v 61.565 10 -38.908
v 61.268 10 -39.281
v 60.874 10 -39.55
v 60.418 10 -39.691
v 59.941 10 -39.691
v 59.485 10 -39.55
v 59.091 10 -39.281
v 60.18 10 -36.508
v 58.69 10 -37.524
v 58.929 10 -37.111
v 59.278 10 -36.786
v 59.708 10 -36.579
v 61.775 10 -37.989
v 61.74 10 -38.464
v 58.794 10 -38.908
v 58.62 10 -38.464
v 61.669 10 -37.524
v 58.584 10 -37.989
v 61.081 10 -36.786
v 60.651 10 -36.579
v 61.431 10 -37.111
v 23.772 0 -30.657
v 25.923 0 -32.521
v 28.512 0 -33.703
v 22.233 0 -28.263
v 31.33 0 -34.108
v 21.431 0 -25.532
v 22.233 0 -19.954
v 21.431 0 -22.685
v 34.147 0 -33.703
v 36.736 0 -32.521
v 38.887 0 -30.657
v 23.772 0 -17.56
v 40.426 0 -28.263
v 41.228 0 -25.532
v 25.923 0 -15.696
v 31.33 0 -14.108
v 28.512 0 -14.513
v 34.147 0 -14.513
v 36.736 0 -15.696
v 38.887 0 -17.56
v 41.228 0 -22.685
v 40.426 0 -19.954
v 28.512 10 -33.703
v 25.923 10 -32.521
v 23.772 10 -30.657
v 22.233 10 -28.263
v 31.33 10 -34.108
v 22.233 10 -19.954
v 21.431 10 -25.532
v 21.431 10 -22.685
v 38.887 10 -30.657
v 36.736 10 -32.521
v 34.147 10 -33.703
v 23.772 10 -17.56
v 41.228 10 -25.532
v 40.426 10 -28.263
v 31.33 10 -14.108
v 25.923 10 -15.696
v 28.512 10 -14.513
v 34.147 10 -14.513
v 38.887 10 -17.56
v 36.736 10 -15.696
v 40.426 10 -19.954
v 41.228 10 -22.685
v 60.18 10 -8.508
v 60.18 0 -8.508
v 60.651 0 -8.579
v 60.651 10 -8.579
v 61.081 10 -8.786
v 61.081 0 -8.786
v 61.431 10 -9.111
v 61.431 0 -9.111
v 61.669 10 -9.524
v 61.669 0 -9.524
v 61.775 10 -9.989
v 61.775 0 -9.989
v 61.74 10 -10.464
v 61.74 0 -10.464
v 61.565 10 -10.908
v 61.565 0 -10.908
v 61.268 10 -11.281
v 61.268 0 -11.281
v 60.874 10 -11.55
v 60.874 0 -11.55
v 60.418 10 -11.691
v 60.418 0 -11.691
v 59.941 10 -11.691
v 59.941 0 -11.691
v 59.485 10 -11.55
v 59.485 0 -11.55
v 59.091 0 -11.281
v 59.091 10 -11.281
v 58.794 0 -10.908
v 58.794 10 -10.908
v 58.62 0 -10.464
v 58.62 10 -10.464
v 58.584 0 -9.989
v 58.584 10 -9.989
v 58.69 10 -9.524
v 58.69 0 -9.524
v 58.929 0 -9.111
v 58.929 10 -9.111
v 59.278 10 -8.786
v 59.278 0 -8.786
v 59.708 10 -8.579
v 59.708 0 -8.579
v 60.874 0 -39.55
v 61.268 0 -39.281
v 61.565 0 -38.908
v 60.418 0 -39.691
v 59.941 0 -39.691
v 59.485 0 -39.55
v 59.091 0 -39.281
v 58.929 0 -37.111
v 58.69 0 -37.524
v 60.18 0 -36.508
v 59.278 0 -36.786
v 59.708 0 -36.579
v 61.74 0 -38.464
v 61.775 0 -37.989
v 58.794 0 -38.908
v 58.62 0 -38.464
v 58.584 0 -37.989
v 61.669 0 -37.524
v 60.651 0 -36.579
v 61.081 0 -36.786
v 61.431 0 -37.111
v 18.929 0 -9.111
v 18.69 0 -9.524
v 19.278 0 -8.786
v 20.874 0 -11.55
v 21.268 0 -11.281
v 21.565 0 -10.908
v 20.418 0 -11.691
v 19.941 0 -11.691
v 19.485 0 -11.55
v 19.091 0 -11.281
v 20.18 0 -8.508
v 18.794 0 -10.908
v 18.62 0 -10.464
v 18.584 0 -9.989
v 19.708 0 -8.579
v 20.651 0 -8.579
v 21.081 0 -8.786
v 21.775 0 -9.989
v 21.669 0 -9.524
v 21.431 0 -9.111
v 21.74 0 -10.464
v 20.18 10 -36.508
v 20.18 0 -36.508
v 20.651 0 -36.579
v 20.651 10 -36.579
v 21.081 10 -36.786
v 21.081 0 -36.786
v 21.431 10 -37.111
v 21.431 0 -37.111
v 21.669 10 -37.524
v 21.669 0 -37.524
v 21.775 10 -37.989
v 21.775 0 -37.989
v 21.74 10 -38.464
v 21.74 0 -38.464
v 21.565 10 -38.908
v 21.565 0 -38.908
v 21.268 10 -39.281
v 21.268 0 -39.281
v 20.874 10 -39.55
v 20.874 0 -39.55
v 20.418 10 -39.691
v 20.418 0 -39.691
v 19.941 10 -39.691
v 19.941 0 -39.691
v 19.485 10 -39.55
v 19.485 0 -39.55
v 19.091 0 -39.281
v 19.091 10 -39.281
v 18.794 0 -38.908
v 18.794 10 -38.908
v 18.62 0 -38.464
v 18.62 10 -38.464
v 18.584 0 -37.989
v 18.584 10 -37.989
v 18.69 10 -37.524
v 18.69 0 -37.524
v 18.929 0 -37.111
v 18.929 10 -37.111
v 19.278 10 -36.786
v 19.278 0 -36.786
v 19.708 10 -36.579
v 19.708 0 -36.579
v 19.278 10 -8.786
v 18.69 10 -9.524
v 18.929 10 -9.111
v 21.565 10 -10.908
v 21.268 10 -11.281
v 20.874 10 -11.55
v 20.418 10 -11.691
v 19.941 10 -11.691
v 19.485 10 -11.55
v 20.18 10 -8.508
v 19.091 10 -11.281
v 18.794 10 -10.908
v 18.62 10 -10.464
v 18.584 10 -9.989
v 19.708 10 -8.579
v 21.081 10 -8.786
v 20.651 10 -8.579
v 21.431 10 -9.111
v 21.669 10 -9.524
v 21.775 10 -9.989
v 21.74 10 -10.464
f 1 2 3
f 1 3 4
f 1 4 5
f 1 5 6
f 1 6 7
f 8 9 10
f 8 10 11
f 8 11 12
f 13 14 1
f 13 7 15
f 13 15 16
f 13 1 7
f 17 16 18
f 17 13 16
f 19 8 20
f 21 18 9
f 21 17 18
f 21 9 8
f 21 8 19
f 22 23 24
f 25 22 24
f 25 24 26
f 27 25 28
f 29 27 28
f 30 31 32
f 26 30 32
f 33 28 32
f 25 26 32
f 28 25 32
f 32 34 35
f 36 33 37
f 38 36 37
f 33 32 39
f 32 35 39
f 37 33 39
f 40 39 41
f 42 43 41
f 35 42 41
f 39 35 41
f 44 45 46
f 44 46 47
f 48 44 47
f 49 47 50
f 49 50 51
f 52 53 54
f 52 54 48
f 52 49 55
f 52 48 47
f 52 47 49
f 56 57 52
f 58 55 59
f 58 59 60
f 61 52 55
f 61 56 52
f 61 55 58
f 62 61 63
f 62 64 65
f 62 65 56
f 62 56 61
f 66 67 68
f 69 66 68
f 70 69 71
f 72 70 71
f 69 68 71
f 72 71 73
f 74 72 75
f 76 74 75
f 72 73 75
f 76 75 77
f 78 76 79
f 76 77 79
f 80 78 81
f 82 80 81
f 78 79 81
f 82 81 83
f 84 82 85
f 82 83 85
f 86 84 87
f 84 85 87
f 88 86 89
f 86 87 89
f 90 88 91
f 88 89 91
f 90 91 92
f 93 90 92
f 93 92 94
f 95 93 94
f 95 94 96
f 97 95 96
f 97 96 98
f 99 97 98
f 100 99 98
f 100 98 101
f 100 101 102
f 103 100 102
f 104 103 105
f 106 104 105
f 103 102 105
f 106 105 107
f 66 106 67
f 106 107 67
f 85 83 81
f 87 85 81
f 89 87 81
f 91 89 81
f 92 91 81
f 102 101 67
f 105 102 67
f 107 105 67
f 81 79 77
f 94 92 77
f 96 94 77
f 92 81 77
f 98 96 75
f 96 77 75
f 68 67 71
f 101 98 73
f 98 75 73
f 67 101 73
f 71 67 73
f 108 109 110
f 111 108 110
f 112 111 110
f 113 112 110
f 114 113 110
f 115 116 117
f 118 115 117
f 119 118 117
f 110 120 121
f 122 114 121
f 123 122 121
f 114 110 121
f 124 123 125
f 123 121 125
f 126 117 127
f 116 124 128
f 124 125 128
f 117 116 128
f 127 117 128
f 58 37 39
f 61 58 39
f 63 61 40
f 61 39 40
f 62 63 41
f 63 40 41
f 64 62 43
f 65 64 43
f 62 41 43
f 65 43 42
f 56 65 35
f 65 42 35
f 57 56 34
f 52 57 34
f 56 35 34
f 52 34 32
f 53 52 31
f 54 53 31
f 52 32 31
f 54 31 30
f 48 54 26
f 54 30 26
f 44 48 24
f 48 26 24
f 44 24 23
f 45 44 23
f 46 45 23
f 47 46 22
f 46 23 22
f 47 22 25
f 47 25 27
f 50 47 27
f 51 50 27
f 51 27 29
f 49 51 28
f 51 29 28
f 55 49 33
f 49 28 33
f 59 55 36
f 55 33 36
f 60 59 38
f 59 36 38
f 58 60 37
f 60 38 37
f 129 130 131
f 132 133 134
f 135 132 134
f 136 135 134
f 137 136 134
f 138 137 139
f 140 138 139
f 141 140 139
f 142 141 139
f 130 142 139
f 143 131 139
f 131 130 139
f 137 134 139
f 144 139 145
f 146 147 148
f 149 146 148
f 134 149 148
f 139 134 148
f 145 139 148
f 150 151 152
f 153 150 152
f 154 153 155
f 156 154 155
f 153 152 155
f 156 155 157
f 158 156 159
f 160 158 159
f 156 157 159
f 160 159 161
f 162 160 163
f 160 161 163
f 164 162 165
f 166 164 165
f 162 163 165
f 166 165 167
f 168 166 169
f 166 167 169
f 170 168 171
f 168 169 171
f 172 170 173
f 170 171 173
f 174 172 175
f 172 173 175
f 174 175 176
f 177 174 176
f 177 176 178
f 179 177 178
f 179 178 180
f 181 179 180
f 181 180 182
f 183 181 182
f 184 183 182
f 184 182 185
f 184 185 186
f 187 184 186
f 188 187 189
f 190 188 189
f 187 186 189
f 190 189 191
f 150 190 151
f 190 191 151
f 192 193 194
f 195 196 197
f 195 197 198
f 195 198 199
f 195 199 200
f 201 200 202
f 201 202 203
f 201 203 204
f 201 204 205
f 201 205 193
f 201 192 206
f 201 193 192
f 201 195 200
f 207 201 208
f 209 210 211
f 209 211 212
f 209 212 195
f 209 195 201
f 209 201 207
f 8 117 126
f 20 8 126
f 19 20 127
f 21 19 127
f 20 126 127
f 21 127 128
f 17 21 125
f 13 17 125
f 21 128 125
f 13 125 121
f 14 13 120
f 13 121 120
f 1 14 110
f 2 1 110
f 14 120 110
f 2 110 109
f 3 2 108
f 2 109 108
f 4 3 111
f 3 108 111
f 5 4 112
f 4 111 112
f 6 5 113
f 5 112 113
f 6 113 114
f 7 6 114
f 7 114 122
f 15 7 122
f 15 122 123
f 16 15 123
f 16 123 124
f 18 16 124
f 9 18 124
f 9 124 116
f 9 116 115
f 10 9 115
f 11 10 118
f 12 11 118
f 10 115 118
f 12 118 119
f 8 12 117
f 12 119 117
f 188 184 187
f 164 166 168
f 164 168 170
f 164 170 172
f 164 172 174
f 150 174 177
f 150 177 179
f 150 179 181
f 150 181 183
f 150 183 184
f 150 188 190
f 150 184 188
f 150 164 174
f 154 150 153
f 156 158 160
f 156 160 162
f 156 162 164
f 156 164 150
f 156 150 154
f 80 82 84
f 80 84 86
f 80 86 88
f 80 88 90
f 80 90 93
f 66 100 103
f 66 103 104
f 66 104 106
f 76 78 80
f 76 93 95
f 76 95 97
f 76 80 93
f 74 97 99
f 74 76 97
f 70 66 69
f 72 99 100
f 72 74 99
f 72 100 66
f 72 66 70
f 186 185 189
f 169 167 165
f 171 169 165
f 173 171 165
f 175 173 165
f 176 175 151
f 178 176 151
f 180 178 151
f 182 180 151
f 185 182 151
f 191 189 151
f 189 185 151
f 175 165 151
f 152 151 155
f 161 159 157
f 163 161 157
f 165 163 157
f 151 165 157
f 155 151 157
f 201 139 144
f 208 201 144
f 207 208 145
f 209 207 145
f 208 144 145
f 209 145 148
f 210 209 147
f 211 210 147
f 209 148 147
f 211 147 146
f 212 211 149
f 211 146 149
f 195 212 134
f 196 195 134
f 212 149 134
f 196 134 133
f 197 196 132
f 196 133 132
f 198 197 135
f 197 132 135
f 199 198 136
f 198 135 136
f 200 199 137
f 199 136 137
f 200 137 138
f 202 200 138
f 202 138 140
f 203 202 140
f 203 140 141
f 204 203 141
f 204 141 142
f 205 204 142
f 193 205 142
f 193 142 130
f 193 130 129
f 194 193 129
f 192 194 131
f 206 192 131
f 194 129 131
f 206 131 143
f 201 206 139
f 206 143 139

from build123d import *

# Parameters (mm, degrees)
SKETCH1_R             = 1.6
BOSS_EXTRUDE1_DEPTH   = 10
BOSS_EXTRUDE1_2_DEPTH = 10
BOSS_EXTRUDE1_3_DEPTH = 10
BOSS_EXTRUDE1_4_DEPTH = 10
SKETCH1_R_2           = 10
BOSS_EXTRUDE1_5_DEPTH = 10


with BuildPart() as part:
    # Sketch1 → Boss-Extrude1 (new body)
    with BuildSketch(Plane(origin=(0, 0, 0), x_dir=(1, 0, 0), z_dir=(0, 1, 0))):
        with Locations(Location((20.179637899, 38.108385802, 0), (0, 0, 270))):
            Circle(SKETCH1_R)
    extrude(amount=BOSS_EXTRUDE1_DEPTH)


with BuildPart() as body_2:
    # Sketch1 → Boss-Extrude1 2 (new body)
    with BuildSketch(Plane(origin=(0, 0, 0), x_dir=(1, 0, 0), z_dir=(0, 1, 0))):
        with Locations(Location((60.179637899, 38.108385802, 0), (0, 0, 270))):
            Circle(SKETCH1_R)
    extrude(amount=BOSS_EXTRUDE1_2_DEPTH)


with BuildPart() as body_3:
    # Sketch1 → Boss-Extrude1 3 (new body)
    with BuildSketch(Plane(origin=(0, 0, 0), x_dir=(1, 0, 0), z_dir=(0, 1, 0))):
        with Locations(Location((20.179637899, 10.108385802, 0), (0, 0, 270))):
            Circle(SKETCH1_R)
    extrude(amount=BOSS_EXTRUDE1_3_DEPTH)


with BuildPart() as body_4:
    # Sketch1 → Boss-Extrude1 4 (new body)
    with BuildSketch(Plane(origin=(0, 0, 0), x_dir=(1, 0, 0), z_dir=(0, 1, 0))):
        with Locations(Location((60.179637899, 10.108385802, 0), (0, 0, 270))):
            Circle(SKETCH1_R)
    extrude(amount=BOSS_EXTRUDE1_4_DEPTH)


with BuildPart() as body_5:
    # Sketch1 → Boss-Extrude1 5 (new body)
    with BuildSketch(Plane(origin=(0, 0, 0), x_dir=(1, 0, 0), z_dir=(0, 1, 0))):
        with Locations(Location((31.329637899, 24.108385802, 0), (0, 0, 270))):
            Circle(SKETCH1_R_2)
    extrude(amount=BOSS_EXTRUDE1_5_DEPTH)


solid = Compound([part.part, body_2.part, body_3.part, body_4.part, body_5.part])
